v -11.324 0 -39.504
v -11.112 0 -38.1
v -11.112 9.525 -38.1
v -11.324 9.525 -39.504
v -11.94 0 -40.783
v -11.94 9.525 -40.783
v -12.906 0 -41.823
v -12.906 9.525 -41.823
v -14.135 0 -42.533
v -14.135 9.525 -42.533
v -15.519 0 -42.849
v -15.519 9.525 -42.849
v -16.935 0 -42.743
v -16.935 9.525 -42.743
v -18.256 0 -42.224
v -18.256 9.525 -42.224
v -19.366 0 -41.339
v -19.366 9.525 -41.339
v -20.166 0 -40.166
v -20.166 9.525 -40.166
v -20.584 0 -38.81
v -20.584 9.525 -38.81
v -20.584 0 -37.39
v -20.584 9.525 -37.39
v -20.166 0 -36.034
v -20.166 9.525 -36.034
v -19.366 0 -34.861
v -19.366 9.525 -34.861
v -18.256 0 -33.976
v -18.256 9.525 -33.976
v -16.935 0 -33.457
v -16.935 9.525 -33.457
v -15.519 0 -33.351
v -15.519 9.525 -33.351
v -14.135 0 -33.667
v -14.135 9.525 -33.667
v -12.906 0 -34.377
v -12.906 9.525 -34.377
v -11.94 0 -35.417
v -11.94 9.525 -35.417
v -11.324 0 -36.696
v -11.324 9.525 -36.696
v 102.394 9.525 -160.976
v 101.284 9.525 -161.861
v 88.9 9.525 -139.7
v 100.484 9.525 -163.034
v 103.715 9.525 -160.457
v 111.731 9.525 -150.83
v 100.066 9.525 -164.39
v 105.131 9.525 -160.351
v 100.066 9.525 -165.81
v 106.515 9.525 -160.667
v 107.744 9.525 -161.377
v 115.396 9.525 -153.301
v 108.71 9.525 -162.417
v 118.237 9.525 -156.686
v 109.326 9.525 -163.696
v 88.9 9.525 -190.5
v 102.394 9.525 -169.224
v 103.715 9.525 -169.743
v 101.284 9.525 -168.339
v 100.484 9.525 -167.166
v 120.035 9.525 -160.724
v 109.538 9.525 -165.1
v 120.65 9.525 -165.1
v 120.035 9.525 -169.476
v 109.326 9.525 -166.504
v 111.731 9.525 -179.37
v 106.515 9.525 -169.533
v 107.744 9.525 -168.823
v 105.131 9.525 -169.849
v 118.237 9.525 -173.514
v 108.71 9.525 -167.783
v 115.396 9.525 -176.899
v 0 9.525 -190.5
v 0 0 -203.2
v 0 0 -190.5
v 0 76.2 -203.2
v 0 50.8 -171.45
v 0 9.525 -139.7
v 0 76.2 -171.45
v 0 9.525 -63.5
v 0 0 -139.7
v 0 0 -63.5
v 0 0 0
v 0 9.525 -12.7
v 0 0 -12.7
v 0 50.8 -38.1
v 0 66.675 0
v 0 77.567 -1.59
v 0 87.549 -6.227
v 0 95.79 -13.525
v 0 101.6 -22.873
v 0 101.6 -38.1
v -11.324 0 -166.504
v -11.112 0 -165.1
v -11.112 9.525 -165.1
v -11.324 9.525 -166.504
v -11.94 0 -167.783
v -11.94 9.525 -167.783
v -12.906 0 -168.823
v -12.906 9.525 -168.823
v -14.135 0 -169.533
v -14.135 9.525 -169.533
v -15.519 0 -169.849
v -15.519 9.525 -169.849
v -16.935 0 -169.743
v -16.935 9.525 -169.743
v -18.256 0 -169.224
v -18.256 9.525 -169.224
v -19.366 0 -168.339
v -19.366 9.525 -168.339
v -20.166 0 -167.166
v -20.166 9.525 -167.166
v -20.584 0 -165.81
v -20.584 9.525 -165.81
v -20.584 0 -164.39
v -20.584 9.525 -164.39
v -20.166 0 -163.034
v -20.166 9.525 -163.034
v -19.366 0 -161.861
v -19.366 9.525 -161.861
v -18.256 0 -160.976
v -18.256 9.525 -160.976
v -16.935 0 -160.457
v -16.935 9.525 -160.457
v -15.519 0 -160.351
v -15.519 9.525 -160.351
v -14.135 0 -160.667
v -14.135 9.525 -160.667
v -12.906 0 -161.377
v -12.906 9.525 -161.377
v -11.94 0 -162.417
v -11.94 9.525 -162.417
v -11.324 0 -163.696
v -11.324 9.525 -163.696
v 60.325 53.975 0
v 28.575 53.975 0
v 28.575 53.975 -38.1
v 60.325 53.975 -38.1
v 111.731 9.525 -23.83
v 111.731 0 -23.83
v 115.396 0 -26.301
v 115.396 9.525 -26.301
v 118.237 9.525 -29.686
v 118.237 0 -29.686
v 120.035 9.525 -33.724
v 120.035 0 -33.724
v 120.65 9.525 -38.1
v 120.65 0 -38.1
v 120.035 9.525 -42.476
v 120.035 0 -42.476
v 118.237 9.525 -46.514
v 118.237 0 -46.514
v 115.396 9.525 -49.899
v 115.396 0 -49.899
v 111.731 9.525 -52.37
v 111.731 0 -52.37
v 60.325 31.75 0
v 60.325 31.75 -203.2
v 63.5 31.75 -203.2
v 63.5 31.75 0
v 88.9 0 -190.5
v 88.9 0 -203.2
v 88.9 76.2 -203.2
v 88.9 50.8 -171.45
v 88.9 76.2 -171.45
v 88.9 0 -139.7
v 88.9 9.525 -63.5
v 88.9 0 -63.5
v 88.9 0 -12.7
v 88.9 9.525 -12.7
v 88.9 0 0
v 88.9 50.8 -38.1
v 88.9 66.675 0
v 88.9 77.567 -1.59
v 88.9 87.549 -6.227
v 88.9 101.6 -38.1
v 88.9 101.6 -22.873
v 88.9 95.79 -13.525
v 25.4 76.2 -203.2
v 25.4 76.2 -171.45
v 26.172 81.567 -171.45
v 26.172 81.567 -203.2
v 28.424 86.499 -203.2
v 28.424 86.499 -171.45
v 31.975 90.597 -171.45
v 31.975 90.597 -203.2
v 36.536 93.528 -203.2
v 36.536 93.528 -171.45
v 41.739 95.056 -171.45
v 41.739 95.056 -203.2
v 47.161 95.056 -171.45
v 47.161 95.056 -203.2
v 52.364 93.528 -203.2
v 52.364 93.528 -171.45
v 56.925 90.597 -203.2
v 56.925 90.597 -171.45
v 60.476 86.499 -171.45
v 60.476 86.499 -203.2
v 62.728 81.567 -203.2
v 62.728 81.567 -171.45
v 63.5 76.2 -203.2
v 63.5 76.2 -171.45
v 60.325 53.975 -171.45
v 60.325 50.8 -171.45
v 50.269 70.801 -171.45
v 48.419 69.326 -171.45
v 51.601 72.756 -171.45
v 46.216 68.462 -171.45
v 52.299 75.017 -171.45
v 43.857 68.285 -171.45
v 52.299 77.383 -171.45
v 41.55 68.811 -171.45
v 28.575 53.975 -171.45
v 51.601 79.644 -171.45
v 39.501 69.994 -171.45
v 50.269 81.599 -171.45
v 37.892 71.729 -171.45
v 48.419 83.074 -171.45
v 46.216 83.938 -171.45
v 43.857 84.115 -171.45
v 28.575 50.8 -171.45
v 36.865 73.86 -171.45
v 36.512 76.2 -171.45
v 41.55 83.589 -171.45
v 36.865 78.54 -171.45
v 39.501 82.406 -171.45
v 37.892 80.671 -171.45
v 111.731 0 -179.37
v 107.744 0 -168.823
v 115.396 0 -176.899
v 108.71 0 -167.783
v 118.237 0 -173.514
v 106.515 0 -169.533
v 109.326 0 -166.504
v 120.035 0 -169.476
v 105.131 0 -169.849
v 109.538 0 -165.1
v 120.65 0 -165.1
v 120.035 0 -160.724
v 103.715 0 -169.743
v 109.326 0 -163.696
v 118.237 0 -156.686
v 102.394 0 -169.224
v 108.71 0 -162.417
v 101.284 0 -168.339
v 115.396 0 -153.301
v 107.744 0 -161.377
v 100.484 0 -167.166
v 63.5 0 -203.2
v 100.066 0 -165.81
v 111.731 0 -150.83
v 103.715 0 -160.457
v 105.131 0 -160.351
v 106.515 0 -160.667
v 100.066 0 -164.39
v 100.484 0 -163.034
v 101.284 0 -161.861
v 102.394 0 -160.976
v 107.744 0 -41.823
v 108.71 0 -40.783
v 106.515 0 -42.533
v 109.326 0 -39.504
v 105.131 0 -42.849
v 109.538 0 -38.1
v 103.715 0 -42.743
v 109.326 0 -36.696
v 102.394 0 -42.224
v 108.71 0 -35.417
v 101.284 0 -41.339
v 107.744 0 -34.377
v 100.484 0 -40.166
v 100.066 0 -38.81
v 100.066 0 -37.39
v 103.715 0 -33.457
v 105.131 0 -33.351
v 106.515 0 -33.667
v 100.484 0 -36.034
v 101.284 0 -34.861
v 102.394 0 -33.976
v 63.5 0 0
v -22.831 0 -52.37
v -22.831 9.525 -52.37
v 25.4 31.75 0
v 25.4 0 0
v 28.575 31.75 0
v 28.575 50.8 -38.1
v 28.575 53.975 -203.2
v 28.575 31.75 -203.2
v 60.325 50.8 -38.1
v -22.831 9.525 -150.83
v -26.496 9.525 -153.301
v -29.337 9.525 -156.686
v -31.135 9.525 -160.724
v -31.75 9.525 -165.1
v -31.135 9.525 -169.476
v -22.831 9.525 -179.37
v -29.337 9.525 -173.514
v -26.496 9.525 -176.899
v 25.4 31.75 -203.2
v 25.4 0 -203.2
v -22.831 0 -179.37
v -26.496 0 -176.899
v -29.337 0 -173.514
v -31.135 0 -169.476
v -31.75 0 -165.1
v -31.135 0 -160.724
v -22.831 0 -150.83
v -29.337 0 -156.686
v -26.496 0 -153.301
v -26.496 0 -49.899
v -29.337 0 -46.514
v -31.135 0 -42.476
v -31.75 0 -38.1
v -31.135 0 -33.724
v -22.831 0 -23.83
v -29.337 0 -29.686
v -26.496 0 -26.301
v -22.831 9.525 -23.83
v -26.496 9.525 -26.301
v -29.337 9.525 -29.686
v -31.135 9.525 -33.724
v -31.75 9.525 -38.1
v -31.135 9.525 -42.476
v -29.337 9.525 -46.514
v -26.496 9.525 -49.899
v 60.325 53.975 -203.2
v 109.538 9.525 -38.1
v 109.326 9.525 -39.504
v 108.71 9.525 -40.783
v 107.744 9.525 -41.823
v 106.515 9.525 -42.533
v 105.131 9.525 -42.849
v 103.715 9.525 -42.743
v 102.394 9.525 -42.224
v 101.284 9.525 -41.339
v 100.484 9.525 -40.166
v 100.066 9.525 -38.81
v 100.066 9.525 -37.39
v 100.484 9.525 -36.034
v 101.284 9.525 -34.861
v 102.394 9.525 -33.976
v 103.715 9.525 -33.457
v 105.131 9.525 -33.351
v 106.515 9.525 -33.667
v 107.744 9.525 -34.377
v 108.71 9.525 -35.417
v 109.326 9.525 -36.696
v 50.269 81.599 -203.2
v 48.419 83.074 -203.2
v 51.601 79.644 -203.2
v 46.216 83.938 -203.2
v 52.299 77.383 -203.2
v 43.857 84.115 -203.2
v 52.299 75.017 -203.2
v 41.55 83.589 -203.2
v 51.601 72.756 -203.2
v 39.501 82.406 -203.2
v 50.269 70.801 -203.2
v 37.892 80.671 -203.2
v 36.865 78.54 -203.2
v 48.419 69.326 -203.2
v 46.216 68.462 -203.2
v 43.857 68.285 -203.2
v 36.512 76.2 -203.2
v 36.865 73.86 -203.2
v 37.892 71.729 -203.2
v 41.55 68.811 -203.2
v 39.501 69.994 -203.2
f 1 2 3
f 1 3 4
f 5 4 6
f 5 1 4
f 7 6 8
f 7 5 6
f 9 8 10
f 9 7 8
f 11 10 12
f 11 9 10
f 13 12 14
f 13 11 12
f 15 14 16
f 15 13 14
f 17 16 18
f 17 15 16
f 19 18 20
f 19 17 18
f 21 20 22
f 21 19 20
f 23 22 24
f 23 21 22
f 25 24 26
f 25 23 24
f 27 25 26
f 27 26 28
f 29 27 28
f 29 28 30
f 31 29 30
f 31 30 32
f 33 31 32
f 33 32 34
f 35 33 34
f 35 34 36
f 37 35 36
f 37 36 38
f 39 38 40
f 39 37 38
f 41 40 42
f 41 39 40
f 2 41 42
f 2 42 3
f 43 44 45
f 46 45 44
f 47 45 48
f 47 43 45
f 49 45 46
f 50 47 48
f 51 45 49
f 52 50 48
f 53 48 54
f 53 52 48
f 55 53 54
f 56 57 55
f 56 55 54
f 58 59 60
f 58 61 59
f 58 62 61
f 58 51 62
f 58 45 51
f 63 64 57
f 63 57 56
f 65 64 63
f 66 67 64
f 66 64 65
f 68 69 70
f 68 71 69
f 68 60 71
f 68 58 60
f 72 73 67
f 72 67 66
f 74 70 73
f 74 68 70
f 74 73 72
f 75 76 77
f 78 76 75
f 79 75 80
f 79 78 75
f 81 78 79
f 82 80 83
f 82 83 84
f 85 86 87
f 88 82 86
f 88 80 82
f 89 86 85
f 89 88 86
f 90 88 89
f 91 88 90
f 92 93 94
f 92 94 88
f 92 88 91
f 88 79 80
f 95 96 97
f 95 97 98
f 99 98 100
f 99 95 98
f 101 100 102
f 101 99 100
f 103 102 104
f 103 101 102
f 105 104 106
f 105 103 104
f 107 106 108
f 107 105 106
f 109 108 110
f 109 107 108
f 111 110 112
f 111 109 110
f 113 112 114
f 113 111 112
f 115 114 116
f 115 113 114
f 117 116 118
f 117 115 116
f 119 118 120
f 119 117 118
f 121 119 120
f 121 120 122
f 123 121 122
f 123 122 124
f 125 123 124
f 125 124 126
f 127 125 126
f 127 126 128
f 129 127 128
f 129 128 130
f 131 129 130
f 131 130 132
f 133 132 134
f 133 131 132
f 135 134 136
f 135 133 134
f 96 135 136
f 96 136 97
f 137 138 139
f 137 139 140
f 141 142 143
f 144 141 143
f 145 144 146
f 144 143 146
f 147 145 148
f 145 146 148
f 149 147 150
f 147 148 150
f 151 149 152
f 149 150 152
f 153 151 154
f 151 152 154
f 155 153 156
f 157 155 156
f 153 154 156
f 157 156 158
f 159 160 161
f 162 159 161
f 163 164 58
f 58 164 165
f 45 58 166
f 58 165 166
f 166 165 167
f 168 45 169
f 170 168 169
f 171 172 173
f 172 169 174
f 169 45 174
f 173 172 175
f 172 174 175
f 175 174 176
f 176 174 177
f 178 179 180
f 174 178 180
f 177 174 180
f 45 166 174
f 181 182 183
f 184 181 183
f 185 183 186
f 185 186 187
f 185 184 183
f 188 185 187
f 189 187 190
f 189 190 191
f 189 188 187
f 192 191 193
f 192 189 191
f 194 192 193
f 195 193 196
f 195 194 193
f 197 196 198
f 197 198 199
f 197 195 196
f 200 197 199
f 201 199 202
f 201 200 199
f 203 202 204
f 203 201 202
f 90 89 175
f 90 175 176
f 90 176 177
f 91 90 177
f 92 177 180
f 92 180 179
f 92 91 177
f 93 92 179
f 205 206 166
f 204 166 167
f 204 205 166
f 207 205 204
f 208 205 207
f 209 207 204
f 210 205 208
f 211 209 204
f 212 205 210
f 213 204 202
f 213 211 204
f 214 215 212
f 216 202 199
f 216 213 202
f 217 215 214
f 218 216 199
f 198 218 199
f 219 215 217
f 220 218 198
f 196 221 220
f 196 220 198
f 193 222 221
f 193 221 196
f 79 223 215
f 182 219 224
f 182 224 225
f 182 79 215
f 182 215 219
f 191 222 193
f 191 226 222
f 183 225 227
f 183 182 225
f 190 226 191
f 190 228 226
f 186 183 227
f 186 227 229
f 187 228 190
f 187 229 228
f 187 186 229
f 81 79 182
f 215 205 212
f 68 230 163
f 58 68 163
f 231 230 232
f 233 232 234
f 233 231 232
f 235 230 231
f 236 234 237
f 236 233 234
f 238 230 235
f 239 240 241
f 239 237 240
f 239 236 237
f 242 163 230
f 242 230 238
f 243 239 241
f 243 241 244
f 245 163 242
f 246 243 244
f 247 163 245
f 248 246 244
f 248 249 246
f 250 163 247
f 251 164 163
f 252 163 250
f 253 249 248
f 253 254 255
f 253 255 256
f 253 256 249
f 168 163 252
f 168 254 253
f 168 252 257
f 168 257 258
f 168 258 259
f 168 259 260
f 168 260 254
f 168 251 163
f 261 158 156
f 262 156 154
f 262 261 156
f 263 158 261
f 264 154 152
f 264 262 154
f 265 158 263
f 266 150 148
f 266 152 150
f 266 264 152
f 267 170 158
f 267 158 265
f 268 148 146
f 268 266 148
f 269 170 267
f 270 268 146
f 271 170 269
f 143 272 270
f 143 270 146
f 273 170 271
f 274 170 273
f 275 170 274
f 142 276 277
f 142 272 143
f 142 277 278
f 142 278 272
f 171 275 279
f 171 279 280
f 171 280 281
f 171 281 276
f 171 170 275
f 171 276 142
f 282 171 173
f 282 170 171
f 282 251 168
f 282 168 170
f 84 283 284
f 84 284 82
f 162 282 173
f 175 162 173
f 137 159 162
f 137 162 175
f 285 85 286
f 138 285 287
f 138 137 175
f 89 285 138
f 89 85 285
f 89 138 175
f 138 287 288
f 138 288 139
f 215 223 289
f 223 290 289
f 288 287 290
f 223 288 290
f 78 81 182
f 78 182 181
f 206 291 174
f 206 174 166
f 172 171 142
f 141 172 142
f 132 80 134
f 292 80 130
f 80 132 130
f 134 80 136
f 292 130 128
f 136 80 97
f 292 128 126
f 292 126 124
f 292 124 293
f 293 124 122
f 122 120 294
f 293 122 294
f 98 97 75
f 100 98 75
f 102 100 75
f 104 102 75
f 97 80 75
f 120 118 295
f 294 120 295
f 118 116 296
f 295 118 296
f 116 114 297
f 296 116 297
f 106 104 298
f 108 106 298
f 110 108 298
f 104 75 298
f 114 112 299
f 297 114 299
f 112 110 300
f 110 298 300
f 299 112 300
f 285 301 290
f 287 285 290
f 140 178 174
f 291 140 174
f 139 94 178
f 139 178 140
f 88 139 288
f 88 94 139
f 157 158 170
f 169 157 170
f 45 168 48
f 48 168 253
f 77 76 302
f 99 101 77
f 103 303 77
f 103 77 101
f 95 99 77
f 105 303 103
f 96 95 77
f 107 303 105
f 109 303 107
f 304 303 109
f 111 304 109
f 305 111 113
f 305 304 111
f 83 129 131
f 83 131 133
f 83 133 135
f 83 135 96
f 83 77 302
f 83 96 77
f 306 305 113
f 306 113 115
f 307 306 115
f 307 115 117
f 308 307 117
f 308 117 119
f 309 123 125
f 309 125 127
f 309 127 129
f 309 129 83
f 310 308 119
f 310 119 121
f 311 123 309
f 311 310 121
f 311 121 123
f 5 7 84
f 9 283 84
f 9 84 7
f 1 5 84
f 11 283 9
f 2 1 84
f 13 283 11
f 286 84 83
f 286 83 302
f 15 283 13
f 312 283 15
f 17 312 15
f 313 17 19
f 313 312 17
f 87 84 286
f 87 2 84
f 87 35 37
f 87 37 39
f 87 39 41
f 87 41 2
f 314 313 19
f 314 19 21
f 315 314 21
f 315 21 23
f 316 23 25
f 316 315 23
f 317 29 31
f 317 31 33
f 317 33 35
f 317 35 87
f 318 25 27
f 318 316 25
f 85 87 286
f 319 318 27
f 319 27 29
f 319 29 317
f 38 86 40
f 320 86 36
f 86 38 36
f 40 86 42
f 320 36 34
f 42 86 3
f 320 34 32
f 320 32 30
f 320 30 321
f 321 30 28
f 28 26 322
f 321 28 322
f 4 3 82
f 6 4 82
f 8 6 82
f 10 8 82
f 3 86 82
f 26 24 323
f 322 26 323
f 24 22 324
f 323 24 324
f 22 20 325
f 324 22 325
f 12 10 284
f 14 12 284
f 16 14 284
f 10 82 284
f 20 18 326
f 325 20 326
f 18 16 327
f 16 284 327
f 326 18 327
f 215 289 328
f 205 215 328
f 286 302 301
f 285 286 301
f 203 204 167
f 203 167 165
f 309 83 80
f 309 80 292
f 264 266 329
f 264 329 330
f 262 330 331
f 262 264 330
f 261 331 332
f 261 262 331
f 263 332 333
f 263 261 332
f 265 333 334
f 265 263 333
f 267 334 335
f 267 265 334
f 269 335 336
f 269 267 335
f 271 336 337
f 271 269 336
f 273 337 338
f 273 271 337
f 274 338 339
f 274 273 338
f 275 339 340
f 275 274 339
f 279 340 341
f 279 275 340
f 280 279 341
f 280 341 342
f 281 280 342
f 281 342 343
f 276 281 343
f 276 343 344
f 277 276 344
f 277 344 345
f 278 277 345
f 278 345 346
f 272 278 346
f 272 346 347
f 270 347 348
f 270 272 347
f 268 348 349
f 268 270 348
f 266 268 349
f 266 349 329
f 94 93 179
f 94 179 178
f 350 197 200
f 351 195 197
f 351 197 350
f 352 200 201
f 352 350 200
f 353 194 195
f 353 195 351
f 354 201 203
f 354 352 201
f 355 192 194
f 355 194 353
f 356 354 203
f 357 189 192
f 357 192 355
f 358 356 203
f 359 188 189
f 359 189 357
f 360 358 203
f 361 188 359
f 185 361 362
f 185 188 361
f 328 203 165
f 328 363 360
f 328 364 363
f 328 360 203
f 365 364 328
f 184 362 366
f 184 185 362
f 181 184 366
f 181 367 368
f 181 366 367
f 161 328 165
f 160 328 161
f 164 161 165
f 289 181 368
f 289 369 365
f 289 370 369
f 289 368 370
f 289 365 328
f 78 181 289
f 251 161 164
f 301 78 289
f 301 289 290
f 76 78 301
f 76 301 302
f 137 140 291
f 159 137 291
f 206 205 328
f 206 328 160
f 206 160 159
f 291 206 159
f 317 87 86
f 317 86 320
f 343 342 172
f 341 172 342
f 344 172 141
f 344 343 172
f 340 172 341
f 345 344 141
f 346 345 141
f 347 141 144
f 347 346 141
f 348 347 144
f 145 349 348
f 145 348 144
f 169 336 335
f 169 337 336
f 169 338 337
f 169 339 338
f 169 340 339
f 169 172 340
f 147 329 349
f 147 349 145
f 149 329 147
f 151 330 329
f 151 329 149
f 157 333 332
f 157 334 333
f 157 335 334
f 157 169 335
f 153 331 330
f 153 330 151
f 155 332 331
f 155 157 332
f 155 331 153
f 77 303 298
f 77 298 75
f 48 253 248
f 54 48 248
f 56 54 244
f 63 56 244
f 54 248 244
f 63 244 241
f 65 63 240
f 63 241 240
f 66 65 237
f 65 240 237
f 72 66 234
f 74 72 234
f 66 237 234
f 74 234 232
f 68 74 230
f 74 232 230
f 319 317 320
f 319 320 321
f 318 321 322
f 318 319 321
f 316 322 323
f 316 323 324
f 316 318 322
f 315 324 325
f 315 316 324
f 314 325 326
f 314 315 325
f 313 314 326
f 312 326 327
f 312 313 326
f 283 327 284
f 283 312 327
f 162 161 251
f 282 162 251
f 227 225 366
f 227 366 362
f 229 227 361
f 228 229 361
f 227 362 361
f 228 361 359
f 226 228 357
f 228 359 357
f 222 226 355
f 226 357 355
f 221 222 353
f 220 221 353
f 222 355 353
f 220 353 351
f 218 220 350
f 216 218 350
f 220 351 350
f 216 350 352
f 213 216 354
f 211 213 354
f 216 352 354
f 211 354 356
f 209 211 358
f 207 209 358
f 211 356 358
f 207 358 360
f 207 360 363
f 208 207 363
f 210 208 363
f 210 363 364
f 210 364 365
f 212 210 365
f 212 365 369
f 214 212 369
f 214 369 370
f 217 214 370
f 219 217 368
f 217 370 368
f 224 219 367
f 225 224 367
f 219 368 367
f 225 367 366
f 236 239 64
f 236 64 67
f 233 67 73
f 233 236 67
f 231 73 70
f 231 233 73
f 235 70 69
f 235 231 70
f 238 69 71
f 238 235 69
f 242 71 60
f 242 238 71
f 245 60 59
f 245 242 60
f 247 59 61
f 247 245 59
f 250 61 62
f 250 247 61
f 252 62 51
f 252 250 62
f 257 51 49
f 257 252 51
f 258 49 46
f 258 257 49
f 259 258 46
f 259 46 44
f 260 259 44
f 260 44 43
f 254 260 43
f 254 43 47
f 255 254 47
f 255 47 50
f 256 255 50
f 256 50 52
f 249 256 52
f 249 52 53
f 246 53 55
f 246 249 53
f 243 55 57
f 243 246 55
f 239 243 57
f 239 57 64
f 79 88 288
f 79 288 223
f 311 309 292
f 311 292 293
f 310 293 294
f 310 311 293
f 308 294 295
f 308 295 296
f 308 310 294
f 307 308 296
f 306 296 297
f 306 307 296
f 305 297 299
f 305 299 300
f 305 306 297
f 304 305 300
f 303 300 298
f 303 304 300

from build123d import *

# Parameters (mm, degrees)
BOSS_EXTRUDE1_DEPTH = 88.9
CUT_EXTRUDE1_DEPTH  = 203.2
BOSS_EXTRUDE2_DEPTH = 31.75
SKETCH5_R           = 7.9375
CUT_EXTRUDE2_DEPTH  = 31.75
SKETCH6_R           = 4.7625
BOSS_EXTRUDE3_DEPTH = 9.525


with BuildPart() as part:
    # Sketch2 → Boss-Extrude1 (new body)
    with BuildSketch(Plane(origin=(0, 0, 0), x_dir=(0, 0, -1), z_dir=(1, 0, 0))):
        with BuildLine():
            Line((0, 0), (0, 66.675))
            ThreePointArc((0, 66.675), (6.227207921, 87.549269451), (22.873234913, 101.6))
            Line((22.873234913, 101.6), (38.1, 101.6))
            Line((38.1, 101.6), (38.1, 50.8))
            Line((38.1, 50.8), (171.45, 50.8))
            Line((171.45, 50.8), (171.45, 76.2))
            Line((171.45, 76.2), (203.2, 76.2))
            Line((203.2, 76.2), (203.2, 0))
            Line((203.2, 0), (171.45, 0))
            Line((171.45, 0), (38.1, 0))
            Line((38.1, 0), (0, 0))
        make_face()
    extrude(amount=BOSS_EXTRUDE1_DEPTH)

    # Sketch3 → Cut-Extrude1 (cut)
    with BuildSketch(Plane(origin=(0, 0, -203.2), x_dir=(-1, 0, 0), z_dir=(0, 0, -1))):
        Polygon((-44.45, 0), (-25.4, 0), (-25.4, 31.75), (-28.575, 31.75), (-28.575, 53.975), (-60.325, 53.975), (-60.325, 31.75), (-63.5, 31.75), (-63.5, 0), align=None)
    extrude(amount=-CUT_EXTRUDE1_DEPTH, mode=Mode.SUBTRACT)

    # Sketch4 → Boss-Extrude2 (add)
    with BuildSketch(Plane(origin=(0, 0, -203.2), x_dir=(-1, 0, 0), z_dir=(0, 0, -1))):
        with BuildLine():
            Line((-63.5, 76.2), (-25.4, 76.2))
            ThreePointArc((-25.4, 76.2), (-44.45, 95.25), (-63.5, 76.2))
        make_face()
    extrude(amount=-BOSS_EXTRUDE2_DEPTH)

    # Sketch5 → Cut-Extrude2 (cut)
    with BuildSketch(Plane(origin=(0, 0, -203.2), x_dir=(-1, 0, 0), z_dir=(0, 0, -1))):
        with Locations((-44.45, 76.2)):
            Circle(SKETCH5_R)
    extrude(amount=-CUT_EXTRUDE2_DEPTH, mode=Mode.SUBTRACT)

    # Sketch6 → Boss-Extrude3 (add)
    with BuildSketch(Plane(origin=(0, 0, 0), x_dir=(1, 0, 0), z_dir=(0, 1, 0))):
        with BuildLine():
            ThreePointArc((-22.831460674, 23.830337079), (-31.75, 38.1), (-22.831460674, 52.369662921))
            Line((-22.831460674, 52.369662921), (0, 63.5))
            Line((0, 63.5), (0, 12.7))
            Line((0, 12.7), (-22.831460674, 23.830337079))
        make_face()
        with Locations((-15.875, 38.1)):
            Circle(SKETCH6_R, mode=Mode.SUBTRACT)
        with BuildLine():
            ThreePointArc((-22.831460674, 150.830337079), (-31.75, 165.1), (-22.831460674, 179.369662921))
            Line((-22.831460674, 179.369662921), (0, 190.5))
            Line((0, 190.5), (0, 139.7))
            Line((0, 139.7), (-22.831460674, 150.830337079))
        make_face()
        with Locations((-15.875, 165.1)):
            Circle(SKETCH6_R, mode=Mode.SUBTRACT)
        with BuildLine():
            Line((88.9, 139.7), (111.731460674, 150.830337079))
            ThreePointArc((111.731460674, 150.830337079), (120.65, 165.1), (111.731460674, 179.369662921))
            Line((111.731460674, 179.369662921), (88.9, 190.5))
            Line((88.9, 190.5), (88.9, 139.7))
        make_face()
        with Locations((104.775, 165.1)):
            Circle(SKETCH6_R, mode=Mode.SUBTRACT)
        with BuildLine():
            Line((88.9, 12.7), (111.731460674, 23.830337079))
            ThreePointArc((111.731460674, 23.830337079), (120.65, 38.1), (111.731460674, 52.369662921))
            Line((111.731460674, 52.369662921), (88.9, 63.5))
            Line((88.9, 63.5), (88.9, 12.7))
        make_face()
        with Locations((104.775, 38.1)):
            Circle(SKETCH6_R, mode=Mode.SUBTRACT)
    extrude(amount=BOSS_EXTRUDE3_DEPTH)


solid = part.part
